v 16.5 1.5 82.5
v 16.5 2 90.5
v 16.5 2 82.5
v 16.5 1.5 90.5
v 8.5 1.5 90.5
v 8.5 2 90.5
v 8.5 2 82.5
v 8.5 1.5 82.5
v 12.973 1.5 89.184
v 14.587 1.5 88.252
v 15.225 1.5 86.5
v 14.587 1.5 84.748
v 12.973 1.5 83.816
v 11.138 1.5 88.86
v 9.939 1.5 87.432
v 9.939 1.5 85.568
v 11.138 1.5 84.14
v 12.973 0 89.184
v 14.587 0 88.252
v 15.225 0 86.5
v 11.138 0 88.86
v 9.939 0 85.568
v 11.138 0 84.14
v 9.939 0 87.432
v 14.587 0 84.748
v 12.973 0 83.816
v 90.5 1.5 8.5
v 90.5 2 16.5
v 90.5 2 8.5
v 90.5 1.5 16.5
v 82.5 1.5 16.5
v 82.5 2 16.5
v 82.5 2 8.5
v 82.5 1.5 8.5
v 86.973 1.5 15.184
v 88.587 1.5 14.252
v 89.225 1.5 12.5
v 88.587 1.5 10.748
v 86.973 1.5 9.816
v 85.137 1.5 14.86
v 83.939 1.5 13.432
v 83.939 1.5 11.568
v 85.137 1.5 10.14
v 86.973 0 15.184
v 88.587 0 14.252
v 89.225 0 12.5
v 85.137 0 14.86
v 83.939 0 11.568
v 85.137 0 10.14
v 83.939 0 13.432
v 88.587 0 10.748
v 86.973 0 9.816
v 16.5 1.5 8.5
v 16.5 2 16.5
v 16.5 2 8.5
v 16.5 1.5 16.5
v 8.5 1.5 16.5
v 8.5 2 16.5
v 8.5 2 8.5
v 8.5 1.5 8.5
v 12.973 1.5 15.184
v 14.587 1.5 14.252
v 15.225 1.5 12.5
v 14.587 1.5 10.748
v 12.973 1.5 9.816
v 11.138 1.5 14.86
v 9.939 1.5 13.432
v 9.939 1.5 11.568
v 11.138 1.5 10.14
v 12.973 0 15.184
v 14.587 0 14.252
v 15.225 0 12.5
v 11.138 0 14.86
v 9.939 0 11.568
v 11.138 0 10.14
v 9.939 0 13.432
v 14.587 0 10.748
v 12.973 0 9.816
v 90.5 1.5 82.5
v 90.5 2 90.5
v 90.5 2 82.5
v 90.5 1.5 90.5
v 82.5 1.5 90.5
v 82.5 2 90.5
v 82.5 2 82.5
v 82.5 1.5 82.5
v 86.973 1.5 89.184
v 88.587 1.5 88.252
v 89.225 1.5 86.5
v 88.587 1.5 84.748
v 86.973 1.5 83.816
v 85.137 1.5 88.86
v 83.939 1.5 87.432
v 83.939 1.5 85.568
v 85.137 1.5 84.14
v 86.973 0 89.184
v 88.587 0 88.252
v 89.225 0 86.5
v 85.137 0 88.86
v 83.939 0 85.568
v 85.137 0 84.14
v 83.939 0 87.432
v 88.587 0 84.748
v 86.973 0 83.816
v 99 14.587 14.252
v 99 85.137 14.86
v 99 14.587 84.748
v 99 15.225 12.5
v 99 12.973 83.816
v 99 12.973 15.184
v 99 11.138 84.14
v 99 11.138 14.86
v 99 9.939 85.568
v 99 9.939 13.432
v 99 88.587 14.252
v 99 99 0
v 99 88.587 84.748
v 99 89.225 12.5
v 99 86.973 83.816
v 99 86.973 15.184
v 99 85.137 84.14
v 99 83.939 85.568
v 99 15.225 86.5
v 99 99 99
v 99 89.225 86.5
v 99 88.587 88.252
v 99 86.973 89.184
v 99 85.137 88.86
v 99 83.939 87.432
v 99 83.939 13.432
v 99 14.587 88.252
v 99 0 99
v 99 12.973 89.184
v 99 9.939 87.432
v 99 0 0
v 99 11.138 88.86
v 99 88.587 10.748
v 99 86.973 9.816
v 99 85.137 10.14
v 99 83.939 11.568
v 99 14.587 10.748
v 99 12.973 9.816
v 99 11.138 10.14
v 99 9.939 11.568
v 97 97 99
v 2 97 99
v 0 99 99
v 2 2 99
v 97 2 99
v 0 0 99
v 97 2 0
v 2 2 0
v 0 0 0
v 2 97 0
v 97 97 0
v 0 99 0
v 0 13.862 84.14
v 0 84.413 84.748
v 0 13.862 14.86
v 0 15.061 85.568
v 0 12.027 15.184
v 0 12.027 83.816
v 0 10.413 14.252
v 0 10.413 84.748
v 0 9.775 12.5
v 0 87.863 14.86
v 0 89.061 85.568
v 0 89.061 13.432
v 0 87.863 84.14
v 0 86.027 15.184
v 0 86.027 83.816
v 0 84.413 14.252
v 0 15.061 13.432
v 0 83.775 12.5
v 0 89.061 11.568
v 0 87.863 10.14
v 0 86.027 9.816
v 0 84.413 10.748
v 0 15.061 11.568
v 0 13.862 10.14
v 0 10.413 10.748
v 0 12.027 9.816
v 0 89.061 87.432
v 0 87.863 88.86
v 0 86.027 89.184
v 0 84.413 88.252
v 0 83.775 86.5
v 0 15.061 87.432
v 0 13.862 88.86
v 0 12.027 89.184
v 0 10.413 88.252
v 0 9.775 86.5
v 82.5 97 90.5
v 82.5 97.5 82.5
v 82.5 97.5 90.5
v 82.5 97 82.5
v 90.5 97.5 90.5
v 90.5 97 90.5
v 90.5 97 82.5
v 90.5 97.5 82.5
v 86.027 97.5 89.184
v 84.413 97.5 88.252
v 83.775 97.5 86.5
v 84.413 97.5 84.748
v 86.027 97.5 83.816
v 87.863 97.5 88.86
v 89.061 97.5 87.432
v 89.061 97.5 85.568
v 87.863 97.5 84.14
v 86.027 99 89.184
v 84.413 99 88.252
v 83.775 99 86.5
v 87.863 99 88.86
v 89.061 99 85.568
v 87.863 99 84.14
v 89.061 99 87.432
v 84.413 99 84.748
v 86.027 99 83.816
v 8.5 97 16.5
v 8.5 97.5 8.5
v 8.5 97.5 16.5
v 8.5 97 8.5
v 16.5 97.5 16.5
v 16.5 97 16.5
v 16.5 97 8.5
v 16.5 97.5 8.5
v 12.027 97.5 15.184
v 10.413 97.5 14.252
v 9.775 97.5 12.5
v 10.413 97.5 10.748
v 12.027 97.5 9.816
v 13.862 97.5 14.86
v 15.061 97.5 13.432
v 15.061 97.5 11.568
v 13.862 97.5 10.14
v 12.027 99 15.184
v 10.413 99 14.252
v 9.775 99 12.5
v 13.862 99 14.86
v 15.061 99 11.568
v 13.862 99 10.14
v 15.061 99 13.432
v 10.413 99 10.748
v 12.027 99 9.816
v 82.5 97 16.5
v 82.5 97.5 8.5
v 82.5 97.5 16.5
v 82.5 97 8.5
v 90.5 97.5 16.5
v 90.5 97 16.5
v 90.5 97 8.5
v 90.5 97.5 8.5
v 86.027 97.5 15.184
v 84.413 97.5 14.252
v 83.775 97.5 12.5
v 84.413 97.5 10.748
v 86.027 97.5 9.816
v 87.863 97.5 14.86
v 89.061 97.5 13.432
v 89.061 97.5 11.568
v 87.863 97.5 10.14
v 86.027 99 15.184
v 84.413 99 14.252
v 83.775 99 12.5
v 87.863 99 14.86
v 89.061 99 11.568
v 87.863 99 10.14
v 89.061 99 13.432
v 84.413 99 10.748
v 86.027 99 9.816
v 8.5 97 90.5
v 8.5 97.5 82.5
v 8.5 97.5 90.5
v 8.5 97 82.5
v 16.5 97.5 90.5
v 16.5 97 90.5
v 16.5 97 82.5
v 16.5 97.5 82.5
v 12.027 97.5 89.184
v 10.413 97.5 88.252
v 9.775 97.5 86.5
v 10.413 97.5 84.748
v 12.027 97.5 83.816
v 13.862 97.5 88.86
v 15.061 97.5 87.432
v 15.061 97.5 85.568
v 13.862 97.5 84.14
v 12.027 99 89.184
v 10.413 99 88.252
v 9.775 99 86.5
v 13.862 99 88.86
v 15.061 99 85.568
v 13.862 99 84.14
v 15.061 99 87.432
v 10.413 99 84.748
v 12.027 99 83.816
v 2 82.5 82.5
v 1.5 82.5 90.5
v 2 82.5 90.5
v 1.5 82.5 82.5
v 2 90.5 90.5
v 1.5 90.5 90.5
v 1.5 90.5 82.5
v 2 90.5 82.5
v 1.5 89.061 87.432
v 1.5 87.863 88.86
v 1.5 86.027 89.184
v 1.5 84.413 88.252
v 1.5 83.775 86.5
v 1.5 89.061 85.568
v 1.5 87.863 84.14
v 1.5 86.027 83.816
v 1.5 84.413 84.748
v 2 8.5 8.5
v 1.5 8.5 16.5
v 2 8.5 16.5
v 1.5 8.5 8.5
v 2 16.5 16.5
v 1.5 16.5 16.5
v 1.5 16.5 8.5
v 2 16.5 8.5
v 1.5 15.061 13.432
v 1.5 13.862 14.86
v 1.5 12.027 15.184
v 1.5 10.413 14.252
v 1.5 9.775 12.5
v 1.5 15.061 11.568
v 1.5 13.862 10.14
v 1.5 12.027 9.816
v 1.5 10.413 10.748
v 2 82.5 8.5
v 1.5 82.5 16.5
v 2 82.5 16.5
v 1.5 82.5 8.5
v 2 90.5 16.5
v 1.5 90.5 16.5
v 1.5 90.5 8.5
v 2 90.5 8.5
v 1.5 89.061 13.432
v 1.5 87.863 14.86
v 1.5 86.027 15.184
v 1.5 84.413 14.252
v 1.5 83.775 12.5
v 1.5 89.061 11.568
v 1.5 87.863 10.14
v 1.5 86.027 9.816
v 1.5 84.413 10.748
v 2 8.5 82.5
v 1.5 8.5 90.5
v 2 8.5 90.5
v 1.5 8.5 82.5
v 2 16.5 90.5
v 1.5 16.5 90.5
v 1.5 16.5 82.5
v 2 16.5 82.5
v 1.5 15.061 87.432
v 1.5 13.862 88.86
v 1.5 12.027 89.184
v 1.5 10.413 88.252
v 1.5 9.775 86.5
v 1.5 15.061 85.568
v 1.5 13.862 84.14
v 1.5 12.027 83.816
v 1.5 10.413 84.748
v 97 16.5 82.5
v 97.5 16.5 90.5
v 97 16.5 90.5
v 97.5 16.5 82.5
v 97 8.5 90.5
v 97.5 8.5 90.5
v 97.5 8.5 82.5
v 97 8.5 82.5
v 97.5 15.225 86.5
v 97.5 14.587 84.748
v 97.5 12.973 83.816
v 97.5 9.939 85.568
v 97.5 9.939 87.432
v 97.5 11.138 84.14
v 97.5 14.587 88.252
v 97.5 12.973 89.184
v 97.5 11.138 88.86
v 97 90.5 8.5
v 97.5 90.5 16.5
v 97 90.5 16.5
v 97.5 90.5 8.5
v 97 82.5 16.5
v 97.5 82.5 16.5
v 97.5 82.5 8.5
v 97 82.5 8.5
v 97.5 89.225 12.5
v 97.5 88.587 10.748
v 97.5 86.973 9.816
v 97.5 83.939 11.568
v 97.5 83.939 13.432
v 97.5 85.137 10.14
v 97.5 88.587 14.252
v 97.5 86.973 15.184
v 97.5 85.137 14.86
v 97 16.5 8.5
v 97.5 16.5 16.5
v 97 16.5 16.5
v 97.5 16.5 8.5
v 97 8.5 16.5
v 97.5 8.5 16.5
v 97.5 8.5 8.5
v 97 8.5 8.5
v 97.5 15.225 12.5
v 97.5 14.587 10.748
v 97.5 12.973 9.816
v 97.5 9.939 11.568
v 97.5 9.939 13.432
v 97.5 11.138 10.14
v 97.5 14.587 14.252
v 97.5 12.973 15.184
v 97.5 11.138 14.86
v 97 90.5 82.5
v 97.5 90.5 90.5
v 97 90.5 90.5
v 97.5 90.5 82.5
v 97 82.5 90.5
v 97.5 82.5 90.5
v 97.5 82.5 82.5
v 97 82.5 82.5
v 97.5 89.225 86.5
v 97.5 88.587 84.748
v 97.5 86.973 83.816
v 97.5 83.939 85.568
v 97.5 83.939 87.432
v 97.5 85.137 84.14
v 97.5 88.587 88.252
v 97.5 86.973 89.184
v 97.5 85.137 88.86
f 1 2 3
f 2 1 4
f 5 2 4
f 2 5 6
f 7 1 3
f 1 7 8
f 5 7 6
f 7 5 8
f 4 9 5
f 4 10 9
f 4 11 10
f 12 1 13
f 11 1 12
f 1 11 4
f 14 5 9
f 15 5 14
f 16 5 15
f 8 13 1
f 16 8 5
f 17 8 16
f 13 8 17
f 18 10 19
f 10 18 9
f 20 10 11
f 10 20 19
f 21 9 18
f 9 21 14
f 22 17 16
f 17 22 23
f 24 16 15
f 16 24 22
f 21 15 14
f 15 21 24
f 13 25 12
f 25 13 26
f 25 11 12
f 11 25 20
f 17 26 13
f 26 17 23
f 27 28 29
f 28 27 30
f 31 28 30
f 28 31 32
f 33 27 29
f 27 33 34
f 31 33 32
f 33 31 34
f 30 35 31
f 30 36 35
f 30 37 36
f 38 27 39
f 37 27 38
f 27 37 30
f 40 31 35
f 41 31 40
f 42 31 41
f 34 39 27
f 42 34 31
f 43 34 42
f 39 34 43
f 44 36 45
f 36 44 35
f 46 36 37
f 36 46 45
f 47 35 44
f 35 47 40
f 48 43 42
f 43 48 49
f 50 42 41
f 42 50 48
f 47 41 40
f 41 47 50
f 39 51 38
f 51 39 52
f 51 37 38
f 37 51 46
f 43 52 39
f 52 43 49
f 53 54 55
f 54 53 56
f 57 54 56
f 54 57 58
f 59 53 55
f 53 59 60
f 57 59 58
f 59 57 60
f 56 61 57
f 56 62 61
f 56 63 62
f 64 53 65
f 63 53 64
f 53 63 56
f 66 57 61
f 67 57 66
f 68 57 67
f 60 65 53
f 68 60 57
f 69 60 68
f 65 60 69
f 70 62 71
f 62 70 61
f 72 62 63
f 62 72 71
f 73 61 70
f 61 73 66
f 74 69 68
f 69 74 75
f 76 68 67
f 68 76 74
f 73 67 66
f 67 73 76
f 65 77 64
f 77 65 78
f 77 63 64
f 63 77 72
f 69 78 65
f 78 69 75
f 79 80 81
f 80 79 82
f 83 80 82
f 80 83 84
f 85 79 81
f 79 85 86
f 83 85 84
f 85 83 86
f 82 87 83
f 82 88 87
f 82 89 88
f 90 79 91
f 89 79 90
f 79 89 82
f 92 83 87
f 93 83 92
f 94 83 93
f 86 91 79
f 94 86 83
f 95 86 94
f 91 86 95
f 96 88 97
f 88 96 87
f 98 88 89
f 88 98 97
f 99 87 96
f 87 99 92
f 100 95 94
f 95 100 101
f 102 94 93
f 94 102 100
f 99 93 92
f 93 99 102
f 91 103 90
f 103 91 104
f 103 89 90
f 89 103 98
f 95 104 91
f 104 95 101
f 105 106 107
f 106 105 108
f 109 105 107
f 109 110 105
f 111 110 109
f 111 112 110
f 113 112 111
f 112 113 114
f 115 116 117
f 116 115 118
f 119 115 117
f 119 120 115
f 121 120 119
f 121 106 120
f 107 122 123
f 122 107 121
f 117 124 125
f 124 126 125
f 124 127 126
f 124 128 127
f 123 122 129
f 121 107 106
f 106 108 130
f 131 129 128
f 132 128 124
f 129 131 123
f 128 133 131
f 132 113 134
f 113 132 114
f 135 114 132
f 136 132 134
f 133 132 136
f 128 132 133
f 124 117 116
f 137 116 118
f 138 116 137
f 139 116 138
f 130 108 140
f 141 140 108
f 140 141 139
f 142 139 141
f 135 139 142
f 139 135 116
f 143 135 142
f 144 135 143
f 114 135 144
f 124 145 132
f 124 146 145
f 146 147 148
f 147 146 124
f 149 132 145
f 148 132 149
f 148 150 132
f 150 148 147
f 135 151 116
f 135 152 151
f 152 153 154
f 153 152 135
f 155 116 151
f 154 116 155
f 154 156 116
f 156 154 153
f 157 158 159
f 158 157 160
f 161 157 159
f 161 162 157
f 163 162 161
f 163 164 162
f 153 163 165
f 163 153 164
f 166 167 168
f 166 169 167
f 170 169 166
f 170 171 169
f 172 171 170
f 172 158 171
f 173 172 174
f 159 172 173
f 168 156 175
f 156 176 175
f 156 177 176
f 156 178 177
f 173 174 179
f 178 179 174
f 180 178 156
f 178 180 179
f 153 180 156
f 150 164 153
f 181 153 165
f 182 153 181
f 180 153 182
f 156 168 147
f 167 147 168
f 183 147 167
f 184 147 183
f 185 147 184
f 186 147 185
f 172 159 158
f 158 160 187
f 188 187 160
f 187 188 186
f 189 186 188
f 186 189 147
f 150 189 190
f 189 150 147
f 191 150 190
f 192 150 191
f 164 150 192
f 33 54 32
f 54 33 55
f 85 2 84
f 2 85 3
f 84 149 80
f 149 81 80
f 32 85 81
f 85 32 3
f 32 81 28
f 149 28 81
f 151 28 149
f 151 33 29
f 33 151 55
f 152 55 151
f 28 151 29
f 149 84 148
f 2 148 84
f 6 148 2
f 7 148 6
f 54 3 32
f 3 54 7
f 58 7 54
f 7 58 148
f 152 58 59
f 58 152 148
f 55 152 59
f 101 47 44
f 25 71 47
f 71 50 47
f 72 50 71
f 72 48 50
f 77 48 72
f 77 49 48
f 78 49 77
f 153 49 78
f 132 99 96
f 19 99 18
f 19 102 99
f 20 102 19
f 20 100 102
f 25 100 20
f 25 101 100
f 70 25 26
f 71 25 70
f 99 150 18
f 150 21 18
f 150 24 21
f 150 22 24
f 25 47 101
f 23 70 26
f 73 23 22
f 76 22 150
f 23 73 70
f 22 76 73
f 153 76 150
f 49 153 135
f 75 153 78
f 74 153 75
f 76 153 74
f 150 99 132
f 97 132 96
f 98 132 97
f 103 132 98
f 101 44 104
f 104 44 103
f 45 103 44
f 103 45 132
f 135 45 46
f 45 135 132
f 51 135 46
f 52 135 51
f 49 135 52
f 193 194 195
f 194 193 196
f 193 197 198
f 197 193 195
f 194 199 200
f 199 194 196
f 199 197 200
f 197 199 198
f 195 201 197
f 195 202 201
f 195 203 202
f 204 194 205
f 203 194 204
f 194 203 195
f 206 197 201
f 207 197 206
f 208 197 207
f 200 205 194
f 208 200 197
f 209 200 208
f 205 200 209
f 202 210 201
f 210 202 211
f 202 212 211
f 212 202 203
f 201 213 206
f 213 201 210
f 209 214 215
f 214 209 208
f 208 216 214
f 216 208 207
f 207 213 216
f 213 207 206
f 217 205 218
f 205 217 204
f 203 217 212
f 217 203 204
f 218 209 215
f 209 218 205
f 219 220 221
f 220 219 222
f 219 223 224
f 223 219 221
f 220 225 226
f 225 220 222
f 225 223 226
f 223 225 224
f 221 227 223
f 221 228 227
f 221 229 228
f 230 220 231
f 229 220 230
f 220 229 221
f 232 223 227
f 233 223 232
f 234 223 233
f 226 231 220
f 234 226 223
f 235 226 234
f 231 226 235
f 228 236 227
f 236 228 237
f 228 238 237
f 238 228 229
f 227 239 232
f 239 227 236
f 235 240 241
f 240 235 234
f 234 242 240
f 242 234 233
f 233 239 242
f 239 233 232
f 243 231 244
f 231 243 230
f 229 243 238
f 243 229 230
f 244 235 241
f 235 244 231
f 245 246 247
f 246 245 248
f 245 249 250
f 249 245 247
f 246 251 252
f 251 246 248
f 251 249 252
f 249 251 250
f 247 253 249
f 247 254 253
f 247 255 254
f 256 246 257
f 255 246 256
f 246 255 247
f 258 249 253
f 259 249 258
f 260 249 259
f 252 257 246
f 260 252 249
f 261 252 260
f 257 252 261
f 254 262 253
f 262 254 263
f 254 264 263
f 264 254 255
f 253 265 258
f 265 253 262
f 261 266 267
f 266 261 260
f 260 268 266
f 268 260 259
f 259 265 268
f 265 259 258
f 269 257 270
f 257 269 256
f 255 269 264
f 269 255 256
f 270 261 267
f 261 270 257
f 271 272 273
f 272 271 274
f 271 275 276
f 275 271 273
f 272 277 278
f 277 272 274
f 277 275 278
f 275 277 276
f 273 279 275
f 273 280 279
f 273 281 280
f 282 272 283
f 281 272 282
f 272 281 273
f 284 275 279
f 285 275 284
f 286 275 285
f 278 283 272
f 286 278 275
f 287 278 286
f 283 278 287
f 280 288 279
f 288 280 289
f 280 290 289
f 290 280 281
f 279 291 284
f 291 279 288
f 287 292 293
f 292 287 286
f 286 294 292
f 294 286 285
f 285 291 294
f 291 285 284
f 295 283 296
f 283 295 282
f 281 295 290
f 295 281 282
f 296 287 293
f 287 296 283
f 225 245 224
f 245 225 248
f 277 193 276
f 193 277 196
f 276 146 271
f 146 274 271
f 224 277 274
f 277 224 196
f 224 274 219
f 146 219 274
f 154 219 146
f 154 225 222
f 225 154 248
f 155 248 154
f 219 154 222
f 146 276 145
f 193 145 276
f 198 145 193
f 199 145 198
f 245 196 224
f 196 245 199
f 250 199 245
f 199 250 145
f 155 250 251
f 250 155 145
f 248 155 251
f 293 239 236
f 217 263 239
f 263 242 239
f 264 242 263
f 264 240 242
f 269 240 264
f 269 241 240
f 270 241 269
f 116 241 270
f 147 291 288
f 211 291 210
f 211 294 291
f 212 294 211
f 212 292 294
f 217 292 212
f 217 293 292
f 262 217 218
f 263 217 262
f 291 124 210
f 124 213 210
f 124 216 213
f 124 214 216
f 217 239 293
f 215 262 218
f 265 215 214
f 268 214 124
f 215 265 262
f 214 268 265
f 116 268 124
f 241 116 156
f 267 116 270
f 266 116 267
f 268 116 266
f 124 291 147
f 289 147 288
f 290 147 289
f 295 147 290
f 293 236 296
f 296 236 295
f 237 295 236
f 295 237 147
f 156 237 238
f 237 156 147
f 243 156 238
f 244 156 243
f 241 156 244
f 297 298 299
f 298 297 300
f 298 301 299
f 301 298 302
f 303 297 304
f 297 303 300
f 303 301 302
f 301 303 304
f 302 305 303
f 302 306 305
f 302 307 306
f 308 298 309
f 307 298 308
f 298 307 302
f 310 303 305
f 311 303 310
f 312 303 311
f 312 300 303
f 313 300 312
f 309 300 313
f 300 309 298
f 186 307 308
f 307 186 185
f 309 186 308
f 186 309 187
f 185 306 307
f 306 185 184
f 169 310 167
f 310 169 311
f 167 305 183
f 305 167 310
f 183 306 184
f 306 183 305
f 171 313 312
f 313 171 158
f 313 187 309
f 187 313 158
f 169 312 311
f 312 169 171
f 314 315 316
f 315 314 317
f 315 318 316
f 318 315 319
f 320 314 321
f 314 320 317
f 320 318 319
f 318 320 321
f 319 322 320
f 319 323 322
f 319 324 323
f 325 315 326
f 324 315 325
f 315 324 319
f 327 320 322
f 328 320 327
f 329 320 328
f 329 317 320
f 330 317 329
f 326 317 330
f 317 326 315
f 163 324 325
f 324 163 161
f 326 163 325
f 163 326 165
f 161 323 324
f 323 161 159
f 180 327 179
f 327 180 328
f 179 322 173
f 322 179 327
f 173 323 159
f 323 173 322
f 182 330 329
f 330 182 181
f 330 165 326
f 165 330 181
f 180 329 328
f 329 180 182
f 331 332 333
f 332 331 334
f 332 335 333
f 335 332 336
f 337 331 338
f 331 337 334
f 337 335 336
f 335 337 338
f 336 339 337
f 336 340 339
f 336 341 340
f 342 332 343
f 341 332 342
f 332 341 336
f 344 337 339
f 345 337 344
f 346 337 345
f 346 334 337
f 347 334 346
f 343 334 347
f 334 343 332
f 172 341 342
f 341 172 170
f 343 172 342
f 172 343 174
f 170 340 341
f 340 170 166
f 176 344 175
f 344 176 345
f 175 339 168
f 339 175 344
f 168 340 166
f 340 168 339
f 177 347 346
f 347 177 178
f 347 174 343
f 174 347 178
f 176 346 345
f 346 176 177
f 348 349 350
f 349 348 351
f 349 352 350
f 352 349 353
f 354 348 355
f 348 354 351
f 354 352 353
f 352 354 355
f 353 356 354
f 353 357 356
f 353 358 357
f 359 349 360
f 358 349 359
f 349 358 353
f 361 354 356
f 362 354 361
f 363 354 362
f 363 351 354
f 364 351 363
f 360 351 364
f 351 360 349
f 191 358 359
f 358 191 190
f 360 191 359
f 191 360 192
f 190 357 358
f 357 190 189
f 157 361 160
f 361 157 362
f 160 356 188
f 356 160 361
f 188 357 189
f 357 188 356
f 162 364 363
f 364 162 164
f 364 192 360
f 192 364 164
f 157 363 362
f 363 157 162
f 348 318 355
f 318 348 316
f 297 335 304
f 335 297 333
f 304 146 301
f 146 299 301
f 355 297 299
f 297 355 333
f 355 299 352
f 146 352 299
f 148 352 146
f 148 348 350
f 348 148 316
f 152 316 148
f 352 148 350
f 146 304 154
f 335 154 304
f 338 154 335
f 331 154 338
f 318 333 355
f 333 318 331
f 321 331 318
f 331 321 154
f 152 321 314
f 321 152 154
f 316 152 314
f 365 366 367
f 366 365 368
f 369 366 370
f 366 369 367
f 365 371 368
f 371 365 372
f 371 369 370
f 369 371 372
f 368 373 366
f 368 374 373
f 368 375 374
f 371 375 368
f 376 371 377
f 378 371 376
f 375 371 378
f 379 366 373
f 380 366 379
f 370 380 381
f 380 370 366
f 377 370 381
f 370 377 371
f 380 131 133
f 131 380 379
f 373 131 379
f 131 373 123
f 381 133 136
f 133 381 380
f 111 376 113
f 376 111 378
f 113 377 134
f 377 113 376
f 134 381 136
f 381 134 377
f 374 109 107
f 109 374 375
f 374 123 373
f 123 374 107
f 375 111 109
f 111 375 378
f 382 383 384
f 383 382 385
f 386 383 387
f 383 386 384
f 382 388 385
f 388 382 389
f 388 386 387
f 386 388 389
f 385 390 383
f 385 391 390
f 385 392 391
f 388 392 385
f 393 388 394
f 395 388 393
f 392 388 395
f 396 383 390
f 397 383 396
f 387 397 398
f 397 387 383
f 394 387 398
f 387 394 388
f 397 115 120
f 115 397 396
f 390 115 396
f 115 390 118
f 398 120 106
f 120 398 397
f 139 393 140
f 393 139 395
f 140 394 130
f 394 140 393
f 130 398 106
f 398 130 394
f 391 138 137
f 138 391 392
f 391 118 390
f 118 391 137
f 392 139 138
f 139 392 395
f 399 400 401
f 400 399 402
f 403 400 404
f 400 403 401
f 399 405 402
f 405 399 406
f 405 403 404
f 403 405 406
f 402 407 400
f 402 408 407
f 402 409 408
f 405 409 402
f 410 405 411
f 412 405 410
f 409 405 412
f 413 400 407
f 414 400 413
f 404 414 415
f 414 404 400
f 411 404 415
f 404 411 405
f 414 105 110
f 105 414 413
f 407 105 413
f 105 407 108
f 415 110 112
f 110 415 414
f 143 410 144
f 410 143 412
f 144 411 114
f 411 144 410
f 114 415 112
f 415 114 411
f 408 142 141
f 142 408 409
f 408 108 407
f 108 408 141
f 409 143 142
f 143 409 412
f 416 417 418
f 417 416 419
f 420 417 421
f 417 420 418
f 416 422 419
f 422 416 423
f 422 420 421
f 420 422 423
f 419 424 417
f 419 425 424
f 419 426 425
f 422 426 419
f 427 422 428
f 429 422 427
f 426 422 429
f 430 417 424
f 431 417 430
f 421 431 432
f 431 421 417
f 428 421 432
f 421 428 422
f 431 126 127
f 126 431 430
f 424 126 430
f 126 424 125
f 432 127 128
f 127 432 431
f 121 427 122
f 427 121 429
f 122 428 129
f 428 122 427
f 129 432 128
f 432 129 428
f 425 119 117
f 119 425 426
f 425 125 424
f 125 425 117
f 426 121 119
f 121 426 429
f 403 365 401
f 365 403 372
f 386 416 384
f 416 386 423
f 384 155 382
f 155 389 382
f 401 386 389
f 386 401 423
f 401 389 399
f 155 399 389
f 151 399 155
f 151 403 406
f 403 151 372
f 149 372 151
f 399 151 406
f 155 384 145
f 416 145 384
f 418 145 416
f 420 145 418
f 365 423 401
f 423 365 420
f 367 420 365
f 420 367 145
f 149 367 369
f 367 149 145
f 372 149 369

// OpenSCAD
error_on_not_interconnectable=false; // [true, false]

wall_thickness=2;
box_size=99;
hole_offset=12.5;

grid_n=4;
grid_h=0.5;

prep_hole_d=8;
prep_hole_geo="square"; // [square, circle]

with_grid=false; // [true, false]

if (error_on_not_interconnectable) {
assert(box_size/2 > 2*hole_offset, "Settings yields non interconnectable boxes"); 
}

module rotate_about_pt(z, y, pt) {
    translate(pt)
        rotate([0, y, z])
            translate(-pt)
                children();   
}

module side(with_grid=false){
    max_pt = box_size-hole_offset;
    min_pt = hole_offset;
    difference() {
    difference() {
        cube([box_size, wall_thickness, box_size]);
        union() {
            translate([min_pt, 0, max_pt]) screwHole();
            translate([max_pt, 0, min_pt]) screwHole();
            translate([min_pt, 0, min_pt]) screwHole();
            translate([max_pt, 0, max_pt]) screwHole();
        }
        
    }
    if (with_grid) {
        grid_size = box_size-2*hole_offset;
        grid_step = grid_size / (grid_n - 1);
        echo (grid_step, hole_offset, grid_size);
        translate([hole_offset, 0, hole_offset]){
        grid_max_i = grid_n-1;
        for(i=[0:grid_max_i]) {
            for (j=[0:grid_max_i]) {
                if (
                    !(i == 0 && (j == 0 || j == grid_max_i)) && 
                    !(i == grid_max_i && (j == 0 || j == grid_max_i))
                ) {
                translate([j*grid_step, -0.01, i*grid_step]) 
                rotate([-90, 0, 0])
                    gridHole();
                }
            }
        }
    }
    }
}

}

module gridHole() {
    cylinder(r=2.5, h=grid_h);
}

module screwHole() {
    // 7.95, prephole
    // 5.45 stopper
        translate([0,1,0])
    
        translate([0,1,0]) {
            if (prep_hole_geo == "square") {
             cube([prep_hole_d, 1, prep_hole_d], center=true);
            } else {
                rotate([90, 0, 0])
                circle(r=prep_hole_d/2, h=2);
            }
        }
        
        translate([0, wall_thickness+0.1,0])
        rotate([90,0,0])
        cylinder(r=5.45/2, h=5);
}

module box(with_grid=false) {
center_pt=box_size/2;
translate([0, box_size]) 
rotate_about_pt(180,0,[center_pt,0,center_pt])
    side(with_grid=with_grid);
side(with_grid=with_grid);

rotate([0,0,90])
rotate_about_pt(180,0,[center_pt,0,center_pt])
    side();

translate([box_size, 0])
rotate([0,0,90])
    side();
}
box(with_grid=with_grid);
